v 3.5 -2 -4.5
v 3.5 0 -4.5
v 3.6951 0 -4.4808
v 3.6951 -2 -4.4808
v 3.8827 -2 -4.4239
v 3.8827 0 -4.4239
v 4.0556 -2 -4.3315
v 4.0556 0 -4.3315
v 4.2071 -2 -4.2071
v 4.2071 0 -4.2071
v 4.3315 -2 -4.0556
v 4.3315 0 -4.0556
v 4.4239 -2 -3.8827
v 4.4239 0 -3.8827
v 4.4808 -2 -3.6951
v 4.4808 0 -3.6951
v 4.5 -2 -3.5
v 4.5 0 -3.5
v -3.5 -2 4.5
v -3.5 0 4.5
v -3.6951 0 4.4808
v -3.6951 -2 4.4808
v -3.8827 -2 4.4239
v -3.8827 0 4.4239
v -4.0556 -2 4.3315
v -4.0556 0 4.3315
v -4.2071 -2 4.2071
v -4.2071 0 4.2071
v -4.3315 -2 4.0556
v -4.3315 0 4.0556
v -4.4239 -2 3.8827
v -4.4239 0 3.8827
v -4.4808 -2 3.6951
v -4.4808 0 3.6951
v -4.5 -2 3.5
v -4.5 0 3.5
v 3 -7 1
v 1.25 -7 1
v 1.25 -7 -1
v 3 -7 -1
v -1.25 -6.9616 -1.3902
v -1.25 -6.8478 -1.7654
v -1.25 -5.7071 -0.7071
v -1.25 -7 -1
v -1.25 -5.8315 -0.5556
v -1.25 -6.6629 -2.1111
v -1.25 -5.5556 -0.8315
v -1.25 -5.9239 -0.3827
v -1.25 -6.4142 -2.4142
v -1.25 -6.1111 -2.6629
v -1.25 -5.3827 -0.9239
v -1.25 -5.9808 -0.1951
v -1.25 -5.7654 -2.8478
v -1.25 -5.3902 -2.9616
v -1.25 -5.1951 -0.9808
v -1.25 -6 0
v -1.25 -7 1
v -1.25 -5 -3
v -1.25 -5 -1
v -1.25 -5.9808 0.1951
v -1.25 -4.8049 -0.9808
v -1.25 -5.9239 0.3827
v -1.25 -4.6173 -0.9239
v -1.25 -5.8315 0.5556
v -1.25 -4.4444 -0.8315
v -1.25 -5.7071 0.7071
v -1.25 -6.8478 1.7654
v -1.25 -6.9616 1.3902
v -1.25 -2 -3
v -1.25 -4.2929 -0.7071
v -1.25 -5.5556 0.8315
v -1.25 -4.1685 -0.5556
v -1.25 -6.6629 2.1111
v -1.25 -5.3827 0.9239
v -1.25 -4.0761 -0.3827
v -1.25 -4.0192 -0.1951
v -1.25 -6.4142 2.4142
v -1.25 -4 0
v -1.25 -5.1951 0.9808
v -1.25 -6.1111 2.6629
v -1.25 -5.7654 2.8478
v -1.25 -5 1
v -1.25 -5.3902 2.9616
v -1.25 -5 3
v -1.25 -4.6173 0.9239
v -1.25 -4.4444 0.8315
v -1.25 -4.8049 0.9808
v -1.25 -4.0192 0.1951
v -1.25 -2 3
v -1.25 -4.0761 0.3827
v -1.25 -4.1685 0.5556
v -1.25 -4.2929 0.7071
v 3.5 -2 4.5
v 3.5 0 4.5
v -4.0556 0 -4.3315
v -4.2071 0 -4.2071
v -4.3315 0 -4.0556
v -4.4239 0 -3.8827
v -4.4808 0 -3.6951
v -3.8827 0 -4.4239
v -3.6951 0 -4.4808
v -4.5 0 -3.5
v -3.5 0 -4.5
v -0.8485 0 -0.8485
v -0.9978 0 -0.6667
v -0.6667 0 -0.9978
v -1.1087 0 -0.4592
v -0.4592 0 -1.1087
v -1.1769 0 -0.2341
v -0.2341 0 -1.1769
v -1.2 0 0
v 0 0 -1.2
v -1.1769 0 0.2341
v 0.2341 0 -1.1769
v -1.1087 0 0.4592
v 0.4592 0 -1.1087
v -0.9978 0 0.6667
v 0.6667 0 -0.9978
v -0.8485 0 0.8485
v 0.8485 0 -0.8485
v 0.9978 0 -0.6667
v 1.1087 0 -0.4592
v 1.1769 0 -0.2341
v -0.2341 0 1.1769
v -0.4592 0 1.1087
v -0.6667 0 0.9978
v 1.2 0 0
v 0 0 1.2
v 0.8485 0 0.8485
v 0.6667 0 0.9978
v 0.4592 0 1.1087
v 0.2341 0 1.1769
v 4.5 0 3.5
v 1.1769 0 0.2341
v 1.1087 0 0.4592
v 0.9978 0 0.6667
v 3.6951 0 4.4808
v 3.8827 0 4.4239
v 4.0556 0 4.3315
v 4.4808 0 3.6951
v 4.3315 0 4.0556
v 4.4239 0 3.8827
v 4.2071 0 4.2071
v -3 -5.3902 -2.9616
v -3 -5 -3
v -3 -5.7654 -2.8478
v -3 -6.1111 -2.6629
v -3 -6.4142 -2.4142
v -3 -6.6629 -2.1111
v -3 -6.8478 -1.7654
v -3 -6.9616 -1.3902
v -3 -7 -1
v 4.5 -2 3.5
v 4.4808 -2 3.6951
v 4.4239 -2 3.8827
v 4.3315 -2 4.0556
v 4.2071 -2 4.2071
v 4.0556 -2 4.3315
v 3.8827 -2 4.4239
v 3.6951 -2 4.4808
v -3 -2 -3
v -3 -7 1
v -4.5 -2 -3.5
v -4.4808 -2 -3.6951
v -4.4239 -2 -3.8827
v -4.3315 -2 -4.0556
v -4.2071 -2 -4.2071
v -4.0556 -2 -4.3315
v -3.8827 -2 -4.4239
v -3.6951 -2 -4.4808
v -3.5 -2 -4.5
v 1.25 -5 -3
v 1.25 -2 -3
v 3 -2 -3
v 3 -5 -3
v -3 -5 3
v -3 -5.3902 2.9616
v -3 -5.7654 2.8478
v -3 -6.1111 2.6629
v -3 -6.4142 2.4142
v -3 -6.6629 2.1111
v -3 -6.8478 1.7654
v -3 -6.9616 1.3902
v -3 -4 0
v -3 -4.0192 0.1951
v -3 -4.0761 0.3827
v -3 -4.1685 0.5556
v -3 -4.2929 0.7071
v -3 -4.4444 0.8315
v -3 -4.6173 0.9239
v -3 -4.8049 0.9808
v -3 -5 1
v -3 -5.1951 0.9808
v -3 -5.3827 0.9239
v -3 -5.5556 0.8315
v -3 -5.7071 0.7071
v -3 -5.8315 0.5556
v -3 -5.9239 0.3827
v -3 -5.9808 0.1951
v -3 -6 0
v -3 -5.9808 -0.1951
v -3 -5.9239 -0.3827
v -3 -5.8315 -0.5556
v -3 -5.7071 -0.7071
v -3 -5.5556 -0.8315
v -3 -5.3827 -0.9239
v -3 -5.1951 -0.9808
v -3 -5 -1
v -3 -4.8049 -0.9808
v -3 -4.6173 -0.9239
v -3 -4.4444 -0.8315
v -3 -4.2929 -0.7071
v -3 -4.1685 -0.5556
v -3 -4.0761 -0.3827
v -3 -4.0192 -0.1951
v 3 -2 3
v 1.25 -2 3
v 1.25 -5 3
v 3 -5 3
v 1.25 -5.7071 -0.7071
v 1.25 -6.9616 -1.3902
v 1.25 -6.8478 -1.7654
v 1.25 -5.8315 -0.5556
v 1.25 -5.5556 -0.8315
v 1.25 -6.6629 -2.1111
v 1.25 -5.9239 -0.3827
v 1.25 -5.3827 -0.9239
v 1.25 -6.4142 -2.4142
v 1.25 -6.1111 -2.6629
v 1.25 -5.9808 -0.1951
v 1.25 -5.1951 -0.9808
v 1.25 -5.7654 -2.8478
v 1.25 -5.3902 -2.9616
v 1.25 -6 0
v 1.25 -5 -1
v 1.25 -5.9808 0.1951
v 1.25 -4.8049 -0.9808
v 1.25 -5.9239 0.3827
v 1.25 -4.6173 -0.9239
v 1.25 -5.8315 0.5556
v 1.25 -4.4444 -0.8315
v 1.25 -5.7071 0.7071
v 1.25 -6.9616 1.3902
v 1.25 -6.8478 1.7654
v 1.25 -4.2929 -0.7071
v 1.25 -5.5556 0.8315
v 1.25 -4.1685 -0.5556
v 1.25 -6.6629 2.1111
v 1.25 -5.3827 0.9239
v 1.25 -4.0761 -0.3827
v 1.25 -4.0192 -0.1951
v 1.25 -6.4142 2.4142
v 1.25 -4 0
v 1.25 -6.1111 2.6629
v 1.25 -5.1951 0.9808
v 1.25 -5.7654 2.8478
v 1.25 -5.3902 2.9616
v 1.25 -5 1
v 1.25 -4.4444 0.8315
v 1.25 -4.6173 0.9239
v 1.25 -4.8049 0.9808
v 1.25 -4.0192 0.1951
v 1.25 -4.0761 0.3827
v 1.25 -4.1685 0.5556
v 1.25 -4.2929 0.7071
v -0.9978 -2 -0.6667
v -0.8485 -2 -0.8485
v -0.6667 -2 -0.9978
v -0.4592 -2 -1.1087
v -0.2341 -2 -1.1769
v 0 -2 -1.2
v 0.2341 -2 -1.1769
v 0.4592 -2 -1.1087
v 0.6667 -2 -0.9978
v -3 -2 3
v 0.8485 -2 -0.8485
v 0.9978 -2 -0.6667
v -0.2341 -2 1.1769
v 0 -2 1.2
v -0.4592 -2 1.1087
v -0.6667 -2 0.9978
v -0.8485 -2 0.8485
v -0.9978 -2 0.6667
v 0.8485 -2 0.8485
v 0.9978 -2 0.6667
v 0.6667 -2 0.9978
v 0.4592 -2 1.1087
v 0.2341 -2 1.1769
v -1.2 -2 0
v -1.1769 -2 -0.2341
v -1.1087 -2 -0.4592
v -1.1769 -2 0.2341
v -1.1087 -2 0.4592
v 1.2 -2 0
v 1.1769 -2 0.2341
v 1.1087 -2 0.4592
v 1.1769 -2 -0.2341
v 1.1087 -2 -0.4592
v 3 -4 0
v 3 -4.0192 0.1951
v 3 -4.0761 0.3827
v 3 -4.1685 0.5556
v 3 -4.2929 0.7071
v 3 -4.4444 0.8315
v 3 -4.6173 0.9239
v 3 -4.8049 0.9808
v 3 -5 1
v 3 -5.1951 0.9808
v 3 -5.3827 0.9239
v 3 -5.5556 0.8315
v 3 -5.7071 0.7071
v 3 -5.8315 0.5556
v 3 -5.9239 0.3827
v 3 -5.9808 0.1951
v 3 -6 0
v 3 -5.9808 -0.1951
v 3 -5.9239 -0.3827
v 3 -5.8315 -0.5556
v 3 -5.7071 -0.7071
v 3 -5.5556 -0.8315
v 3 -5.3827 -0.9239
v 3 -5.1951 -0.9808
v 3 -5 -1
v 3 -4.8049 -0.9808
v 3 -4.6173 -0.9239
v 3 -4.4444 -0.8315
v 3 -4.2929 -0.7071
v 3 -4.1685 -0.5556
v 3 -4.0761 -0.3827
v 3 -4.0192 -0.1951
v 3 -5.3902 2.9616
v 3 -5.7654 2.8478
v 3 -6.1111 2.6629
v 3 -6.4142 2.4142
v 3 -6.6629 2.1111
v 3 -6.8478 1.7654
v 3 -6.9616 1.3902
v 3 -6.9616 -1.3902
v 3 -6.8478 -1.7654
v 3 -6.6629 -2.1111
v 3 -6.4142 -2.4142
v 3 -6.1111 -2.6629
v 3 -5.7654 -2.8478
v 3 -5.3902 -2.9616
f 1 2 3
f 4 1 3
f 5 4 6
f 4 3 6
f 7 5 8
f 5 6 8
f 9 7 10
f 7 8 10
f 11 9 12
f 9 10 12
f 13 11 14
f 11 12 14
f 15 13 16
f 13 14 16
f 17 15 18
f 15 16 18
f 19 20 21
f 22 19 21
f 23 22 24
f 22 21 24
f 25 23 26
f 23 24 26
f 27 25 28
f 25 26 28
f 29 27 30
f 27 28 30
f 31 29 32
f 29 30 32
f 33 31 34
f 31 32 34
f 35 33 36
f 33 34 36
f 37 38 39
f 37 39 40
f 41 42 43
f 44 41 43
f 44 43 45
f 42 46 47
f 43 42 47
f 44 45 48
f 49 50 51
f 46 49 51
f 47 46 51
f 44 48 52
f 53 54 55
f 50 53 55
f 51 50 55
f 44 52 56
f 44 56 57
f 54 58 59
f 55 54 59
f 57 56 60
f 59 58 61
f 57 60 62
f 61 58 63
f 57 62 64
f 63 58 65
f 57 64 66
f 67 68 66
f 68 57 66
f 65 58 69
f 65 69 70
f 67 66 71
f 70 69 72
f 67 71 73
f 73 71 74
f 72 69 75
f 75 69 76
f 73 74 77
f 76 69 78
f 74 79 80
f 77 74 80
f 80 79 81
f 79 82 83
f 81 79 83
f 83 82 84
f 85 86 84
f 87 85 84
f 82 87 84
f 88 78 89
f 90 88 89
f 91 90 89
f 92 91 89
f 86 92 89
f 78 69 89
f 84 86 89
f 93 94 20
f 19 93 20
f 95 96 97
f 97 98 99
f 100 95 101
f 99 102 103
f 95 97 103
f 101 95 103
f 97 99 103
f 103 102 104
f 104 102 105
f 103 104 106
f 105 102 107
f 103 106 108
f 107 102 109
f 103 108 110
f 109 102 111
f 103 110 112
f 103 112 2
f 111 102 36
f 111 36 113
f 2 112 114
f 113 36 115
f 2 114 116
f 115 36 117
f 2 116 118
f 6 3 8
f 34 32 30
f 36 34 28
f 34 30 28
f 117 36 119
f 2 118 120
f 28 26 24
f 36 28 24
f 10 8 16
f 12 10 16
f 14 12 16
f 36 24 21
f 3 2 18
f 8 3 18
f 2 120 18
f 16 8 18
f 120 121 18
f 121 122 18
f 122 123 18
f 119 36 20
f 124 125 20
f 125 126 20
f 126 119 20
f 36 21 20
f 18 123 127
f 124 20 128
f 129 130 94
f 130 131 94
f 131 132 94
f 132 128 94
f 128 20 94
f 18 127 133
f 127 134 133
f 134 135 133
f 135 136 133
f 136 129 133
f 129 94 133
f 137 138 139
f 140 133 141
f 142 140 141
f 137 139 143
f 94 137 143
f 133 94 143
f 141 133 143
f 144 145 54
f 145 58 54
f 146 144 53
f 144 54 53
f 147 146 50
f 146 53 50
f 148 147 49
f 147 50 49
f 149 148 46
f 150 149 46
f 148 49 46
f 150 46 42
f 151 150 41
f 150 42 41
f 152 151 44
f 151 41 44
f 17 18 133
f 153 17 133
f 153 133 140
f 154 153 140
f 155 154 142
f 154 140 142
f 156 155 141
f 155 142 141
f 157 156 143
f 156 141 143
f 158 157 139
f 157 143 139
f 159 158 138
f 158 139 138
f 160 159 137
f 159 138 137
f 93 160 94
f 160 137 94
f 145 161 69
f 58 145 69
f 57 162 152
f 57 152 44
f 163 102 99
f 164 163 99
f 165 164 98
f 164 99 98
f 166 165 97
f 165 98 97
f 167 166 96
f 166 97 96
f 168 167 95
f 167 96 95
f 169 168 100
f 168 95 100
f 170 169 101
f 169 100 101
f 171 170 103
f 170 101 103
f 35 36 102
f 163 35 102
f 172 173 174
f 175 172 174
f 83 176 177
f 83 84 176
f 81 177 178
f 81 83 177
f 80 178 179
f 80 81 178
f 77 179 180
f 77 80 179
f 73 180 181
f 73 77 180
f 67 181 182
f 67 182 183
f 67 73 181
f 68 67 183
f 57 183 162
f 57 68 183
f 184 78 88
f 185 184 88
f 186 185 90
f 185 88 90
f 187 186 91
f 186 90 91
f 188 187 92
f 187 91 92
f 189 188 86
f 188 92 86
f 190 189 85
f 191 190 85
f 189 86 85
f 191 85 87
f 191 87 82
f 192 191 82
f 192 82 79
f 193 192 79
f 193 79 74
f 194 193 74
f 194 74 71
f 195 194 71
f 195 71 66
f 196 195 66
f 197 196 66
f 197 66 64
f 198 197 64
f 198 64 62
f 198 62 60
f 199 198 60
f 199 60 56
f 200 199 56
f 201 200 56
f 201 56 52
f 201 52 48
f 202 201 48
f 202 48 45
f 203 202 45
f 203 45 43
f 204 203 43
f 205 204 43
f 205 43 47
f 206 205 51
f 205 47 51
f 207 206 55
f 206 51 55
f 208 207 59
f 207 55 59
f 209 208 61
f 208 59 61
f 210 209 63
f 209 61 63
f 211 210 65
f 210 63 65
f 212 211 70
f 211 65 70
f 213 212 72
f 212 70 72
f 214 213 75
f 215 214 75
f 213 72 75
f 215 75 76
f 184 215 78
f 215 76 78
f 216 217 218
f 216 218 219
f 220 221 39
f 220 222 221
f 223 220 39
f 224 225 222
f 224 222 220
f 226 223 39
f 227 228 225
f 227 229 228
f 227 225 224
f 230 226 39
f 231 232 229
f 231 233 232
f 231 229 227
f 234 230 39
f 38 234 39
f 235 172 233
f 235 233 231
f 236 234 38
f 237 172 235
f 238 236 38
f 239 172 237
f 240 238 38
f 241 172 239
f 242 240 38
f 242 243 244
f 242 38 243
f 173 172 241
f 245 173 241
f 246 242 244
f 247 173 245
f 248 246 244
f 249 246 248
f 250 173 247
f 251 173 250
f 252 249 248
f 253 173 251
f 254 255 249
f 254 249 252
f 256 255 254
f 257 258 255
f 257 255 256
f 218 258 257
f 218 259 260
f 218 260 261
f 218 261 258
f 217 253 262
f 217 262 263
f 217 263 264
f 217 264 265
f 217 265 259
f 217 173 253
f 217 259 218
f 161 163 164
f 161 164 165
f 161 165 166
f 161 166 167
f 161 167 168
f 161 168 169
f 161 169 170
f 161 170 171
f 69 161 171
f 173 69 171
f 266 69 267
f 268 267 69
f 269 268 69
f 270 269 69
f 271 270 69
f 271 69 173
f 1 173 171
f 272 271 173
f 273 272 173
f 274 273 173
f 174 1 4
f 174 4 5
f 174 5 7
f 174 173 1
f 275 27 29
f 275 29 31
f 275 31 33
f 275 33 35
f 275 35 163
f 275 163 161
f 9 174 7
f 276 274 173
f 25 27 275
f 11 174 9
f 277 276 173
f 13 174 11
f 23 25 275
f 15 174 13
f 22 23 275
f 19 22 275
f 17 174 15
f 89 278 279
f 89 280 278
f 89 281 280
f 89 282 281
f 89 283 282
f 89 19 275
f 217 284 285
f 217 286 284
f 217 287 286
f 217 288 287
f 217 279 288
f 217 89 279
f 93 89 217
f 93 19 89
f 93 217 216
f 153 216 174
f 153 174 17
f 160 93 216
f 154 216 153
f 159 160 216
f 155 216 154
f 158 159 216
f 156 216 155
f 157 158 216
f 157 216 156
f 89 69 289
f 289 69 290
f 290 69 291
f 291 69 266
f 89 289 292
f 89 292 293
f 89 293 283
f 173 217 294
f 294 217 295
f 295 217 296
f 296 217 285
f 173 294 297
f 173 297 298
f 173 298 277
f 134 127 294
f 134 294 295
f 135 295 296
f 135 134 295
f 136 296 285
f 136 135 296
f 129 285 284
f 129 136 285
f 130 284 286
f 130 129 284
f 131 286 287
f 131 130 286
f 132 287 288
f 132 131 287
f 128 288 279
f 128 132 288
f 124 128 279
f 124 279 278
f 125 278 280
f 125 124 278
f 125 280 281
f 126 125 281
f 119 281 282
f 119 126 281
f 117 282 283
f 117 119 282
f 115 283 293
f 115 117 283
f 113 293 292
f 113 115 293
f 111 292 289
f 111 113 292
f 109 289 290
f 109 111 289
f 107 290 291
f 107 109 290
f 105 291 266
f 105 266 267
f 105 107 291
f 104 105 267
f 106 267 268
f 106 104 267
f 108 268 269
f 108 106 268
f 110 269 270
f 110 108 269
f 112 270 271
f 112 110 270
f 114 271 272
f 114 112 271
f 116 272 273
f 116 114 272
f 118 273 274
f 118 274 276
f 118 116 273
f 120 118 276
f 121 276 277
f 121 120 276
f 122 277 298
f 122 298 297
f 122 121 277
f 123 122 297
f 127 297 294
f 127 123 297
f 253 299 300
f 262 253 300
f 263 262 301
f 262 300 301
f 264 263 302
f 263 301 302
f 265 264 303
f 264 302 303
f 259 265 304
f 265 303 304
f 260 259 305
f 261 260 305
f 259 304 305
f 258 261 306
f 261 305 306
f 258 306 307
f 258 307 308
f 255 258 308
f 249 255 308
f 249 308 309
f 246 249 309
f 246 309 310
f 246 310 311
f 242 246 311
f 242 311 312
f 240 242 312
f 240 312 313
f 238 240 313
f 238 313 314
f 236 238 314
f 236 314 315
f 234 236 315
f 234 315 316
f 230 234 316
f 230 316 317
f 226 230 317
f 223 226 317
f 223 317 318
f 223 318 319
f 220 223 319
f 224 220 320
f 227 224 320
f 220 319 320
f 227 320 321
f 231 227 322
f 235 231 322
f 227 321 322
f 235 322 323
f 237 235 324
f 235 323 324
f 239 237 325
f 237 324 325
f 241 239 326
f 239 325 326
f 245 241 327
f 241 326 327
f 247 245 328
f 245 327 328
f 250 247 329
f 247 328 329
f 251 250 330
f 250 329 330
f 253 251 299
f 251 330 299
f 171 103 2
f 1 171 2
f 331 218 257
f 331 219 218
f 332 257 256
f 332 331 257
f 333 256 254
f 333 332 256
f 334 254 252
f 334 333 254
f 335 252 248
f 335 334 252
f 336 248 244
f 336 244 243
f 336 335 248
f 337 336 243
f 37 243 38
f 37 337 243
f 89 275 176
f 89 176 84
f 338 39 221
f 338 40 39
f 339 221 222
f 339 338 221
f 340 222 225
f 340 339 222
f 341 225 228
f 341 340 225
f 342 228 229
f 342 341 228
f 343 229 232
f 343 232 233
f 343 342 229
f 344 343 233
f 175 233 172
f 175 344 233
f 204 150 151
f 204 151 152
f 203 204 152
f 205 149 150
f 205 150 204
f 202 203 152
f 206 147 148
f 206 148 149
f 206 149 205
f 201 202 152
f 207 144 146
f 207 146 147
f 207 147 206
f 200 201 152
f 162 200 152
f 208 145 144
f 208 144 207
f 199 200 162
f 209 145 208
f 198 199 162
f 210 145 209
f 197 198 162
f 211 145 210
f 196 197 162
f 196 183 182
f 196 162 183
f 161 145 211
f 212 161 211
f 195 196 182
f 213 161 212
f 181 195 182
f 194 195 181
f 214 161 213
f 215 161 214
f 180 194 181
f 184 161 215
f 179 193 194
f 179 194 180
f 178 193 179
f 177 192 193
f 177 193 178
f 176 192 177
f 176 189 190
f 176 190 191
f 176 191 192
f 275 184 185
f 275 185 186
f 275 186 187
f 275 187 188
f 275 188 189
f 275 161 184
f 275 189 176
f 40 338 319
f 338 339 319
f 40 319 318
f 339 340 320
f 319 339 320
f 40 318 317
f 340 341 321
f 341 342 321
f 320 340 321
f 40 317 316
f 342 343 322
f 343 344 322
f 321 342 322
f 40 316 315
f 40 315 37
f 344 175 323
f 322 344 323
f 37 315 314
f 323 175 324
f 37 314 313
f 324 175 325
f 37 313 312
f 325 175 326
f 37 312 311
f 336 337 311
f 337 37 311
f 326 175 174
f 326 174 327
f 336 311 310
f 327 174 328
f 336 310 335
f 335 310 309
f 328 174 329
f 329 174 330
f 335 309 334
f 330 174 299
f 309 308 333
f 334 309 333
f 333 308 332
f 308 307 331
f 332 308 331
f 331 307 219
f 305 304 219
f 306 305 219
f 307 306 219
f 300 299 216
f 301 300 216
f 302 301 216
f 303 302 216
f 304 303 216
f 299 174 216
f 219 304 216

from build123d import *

# Parameters (mm, degrees)
F0_W     = 2.5
F0_H     = 6
F0_R     = 1.2
F1_DEPTH = 2
F0_W_2   = 1.75
F2_DEPTH = 7
F3_R     = 1
F4_DEPTH = 6
F5_R     = 2
F6_R     = 2


with BuildPart() as f1:
    # F0 (on Front) → F1 (new body)
    with BuildSketch(Plane.XZ):
        with BuildLine():
            Line((-3.5, -4.5), (3.5, -4.5))
            ThreePointArc((3.5, -4.5), (4.2071067812, -4.2071067812), (4.5, -3.5))
            Line((4.5, -3.5), (4.5, 3.5))
            ThreePointArc((4.5, 3.5), (4.2071067812, 4.2071067812), (3.5, 4.5))
            Line((3.5, 4.5), (-3.5, 4.5))
            ThreePointArc((-3.5, 4.5), (-4.2071067812, 4.2071067812), (-4.5, 3.5))
            Line((-4.5, 3.5), (-4.5, -3.5))
            ThreePointArc((-4.5, -3.5), (-4.2071067812, -4.2071067812), (-3.5, -4.5))
        make_face()
        Polygon((3, 3), (3, -3), (1.25, -3), (-1.25, -3), (-3, -3), (-3, 3), (-1.25, 3), (1.25, 3), align=None, mode=Mode.SUBTRACT)
        Rectangle(F0_W, F0_H)
        Circle(F0_R, mode=Mode.SUBTRACT)
    extrude(amount=F1_DEPTH)

    # F0 (on Front) → F2 (join)
    with BuildSketch(Plane.XZ):
        with Locations((-2.125, 0)):
            Rectangle(F0_W_2, F0_H)
        with Locations((2.125, 0)):
            Rectangle(F0_W_2, F0_H)
    extrude(amount=F2_DEPTH)

    # F3 (on face) → F4 (cut)
    with BuildSketch(Plane.YZ.offset(3)):
        with Locations((-5, 0)):
            Circle(F3_R)
    extrude(amount=-F4_DEPTH, mode=Mode.SUBTRACT)

    # F5
    f5_edges = [f1.edges().sort_by_distance(p)[0] for p in [
        (2.125, -7, 3),
    ]]
    fillet(f5_edges, radius=F5_R)

    # F6
    f6_edges = [f1.edges().sort_by_distance(p)[0] for p in [
        (-2.125, -7, 3),
        (-2.125, -7, -3),
        (2.125, -7, -3),
    ]]
    fillet(f6_edges, radius=F6_R)


solid = f1.part
